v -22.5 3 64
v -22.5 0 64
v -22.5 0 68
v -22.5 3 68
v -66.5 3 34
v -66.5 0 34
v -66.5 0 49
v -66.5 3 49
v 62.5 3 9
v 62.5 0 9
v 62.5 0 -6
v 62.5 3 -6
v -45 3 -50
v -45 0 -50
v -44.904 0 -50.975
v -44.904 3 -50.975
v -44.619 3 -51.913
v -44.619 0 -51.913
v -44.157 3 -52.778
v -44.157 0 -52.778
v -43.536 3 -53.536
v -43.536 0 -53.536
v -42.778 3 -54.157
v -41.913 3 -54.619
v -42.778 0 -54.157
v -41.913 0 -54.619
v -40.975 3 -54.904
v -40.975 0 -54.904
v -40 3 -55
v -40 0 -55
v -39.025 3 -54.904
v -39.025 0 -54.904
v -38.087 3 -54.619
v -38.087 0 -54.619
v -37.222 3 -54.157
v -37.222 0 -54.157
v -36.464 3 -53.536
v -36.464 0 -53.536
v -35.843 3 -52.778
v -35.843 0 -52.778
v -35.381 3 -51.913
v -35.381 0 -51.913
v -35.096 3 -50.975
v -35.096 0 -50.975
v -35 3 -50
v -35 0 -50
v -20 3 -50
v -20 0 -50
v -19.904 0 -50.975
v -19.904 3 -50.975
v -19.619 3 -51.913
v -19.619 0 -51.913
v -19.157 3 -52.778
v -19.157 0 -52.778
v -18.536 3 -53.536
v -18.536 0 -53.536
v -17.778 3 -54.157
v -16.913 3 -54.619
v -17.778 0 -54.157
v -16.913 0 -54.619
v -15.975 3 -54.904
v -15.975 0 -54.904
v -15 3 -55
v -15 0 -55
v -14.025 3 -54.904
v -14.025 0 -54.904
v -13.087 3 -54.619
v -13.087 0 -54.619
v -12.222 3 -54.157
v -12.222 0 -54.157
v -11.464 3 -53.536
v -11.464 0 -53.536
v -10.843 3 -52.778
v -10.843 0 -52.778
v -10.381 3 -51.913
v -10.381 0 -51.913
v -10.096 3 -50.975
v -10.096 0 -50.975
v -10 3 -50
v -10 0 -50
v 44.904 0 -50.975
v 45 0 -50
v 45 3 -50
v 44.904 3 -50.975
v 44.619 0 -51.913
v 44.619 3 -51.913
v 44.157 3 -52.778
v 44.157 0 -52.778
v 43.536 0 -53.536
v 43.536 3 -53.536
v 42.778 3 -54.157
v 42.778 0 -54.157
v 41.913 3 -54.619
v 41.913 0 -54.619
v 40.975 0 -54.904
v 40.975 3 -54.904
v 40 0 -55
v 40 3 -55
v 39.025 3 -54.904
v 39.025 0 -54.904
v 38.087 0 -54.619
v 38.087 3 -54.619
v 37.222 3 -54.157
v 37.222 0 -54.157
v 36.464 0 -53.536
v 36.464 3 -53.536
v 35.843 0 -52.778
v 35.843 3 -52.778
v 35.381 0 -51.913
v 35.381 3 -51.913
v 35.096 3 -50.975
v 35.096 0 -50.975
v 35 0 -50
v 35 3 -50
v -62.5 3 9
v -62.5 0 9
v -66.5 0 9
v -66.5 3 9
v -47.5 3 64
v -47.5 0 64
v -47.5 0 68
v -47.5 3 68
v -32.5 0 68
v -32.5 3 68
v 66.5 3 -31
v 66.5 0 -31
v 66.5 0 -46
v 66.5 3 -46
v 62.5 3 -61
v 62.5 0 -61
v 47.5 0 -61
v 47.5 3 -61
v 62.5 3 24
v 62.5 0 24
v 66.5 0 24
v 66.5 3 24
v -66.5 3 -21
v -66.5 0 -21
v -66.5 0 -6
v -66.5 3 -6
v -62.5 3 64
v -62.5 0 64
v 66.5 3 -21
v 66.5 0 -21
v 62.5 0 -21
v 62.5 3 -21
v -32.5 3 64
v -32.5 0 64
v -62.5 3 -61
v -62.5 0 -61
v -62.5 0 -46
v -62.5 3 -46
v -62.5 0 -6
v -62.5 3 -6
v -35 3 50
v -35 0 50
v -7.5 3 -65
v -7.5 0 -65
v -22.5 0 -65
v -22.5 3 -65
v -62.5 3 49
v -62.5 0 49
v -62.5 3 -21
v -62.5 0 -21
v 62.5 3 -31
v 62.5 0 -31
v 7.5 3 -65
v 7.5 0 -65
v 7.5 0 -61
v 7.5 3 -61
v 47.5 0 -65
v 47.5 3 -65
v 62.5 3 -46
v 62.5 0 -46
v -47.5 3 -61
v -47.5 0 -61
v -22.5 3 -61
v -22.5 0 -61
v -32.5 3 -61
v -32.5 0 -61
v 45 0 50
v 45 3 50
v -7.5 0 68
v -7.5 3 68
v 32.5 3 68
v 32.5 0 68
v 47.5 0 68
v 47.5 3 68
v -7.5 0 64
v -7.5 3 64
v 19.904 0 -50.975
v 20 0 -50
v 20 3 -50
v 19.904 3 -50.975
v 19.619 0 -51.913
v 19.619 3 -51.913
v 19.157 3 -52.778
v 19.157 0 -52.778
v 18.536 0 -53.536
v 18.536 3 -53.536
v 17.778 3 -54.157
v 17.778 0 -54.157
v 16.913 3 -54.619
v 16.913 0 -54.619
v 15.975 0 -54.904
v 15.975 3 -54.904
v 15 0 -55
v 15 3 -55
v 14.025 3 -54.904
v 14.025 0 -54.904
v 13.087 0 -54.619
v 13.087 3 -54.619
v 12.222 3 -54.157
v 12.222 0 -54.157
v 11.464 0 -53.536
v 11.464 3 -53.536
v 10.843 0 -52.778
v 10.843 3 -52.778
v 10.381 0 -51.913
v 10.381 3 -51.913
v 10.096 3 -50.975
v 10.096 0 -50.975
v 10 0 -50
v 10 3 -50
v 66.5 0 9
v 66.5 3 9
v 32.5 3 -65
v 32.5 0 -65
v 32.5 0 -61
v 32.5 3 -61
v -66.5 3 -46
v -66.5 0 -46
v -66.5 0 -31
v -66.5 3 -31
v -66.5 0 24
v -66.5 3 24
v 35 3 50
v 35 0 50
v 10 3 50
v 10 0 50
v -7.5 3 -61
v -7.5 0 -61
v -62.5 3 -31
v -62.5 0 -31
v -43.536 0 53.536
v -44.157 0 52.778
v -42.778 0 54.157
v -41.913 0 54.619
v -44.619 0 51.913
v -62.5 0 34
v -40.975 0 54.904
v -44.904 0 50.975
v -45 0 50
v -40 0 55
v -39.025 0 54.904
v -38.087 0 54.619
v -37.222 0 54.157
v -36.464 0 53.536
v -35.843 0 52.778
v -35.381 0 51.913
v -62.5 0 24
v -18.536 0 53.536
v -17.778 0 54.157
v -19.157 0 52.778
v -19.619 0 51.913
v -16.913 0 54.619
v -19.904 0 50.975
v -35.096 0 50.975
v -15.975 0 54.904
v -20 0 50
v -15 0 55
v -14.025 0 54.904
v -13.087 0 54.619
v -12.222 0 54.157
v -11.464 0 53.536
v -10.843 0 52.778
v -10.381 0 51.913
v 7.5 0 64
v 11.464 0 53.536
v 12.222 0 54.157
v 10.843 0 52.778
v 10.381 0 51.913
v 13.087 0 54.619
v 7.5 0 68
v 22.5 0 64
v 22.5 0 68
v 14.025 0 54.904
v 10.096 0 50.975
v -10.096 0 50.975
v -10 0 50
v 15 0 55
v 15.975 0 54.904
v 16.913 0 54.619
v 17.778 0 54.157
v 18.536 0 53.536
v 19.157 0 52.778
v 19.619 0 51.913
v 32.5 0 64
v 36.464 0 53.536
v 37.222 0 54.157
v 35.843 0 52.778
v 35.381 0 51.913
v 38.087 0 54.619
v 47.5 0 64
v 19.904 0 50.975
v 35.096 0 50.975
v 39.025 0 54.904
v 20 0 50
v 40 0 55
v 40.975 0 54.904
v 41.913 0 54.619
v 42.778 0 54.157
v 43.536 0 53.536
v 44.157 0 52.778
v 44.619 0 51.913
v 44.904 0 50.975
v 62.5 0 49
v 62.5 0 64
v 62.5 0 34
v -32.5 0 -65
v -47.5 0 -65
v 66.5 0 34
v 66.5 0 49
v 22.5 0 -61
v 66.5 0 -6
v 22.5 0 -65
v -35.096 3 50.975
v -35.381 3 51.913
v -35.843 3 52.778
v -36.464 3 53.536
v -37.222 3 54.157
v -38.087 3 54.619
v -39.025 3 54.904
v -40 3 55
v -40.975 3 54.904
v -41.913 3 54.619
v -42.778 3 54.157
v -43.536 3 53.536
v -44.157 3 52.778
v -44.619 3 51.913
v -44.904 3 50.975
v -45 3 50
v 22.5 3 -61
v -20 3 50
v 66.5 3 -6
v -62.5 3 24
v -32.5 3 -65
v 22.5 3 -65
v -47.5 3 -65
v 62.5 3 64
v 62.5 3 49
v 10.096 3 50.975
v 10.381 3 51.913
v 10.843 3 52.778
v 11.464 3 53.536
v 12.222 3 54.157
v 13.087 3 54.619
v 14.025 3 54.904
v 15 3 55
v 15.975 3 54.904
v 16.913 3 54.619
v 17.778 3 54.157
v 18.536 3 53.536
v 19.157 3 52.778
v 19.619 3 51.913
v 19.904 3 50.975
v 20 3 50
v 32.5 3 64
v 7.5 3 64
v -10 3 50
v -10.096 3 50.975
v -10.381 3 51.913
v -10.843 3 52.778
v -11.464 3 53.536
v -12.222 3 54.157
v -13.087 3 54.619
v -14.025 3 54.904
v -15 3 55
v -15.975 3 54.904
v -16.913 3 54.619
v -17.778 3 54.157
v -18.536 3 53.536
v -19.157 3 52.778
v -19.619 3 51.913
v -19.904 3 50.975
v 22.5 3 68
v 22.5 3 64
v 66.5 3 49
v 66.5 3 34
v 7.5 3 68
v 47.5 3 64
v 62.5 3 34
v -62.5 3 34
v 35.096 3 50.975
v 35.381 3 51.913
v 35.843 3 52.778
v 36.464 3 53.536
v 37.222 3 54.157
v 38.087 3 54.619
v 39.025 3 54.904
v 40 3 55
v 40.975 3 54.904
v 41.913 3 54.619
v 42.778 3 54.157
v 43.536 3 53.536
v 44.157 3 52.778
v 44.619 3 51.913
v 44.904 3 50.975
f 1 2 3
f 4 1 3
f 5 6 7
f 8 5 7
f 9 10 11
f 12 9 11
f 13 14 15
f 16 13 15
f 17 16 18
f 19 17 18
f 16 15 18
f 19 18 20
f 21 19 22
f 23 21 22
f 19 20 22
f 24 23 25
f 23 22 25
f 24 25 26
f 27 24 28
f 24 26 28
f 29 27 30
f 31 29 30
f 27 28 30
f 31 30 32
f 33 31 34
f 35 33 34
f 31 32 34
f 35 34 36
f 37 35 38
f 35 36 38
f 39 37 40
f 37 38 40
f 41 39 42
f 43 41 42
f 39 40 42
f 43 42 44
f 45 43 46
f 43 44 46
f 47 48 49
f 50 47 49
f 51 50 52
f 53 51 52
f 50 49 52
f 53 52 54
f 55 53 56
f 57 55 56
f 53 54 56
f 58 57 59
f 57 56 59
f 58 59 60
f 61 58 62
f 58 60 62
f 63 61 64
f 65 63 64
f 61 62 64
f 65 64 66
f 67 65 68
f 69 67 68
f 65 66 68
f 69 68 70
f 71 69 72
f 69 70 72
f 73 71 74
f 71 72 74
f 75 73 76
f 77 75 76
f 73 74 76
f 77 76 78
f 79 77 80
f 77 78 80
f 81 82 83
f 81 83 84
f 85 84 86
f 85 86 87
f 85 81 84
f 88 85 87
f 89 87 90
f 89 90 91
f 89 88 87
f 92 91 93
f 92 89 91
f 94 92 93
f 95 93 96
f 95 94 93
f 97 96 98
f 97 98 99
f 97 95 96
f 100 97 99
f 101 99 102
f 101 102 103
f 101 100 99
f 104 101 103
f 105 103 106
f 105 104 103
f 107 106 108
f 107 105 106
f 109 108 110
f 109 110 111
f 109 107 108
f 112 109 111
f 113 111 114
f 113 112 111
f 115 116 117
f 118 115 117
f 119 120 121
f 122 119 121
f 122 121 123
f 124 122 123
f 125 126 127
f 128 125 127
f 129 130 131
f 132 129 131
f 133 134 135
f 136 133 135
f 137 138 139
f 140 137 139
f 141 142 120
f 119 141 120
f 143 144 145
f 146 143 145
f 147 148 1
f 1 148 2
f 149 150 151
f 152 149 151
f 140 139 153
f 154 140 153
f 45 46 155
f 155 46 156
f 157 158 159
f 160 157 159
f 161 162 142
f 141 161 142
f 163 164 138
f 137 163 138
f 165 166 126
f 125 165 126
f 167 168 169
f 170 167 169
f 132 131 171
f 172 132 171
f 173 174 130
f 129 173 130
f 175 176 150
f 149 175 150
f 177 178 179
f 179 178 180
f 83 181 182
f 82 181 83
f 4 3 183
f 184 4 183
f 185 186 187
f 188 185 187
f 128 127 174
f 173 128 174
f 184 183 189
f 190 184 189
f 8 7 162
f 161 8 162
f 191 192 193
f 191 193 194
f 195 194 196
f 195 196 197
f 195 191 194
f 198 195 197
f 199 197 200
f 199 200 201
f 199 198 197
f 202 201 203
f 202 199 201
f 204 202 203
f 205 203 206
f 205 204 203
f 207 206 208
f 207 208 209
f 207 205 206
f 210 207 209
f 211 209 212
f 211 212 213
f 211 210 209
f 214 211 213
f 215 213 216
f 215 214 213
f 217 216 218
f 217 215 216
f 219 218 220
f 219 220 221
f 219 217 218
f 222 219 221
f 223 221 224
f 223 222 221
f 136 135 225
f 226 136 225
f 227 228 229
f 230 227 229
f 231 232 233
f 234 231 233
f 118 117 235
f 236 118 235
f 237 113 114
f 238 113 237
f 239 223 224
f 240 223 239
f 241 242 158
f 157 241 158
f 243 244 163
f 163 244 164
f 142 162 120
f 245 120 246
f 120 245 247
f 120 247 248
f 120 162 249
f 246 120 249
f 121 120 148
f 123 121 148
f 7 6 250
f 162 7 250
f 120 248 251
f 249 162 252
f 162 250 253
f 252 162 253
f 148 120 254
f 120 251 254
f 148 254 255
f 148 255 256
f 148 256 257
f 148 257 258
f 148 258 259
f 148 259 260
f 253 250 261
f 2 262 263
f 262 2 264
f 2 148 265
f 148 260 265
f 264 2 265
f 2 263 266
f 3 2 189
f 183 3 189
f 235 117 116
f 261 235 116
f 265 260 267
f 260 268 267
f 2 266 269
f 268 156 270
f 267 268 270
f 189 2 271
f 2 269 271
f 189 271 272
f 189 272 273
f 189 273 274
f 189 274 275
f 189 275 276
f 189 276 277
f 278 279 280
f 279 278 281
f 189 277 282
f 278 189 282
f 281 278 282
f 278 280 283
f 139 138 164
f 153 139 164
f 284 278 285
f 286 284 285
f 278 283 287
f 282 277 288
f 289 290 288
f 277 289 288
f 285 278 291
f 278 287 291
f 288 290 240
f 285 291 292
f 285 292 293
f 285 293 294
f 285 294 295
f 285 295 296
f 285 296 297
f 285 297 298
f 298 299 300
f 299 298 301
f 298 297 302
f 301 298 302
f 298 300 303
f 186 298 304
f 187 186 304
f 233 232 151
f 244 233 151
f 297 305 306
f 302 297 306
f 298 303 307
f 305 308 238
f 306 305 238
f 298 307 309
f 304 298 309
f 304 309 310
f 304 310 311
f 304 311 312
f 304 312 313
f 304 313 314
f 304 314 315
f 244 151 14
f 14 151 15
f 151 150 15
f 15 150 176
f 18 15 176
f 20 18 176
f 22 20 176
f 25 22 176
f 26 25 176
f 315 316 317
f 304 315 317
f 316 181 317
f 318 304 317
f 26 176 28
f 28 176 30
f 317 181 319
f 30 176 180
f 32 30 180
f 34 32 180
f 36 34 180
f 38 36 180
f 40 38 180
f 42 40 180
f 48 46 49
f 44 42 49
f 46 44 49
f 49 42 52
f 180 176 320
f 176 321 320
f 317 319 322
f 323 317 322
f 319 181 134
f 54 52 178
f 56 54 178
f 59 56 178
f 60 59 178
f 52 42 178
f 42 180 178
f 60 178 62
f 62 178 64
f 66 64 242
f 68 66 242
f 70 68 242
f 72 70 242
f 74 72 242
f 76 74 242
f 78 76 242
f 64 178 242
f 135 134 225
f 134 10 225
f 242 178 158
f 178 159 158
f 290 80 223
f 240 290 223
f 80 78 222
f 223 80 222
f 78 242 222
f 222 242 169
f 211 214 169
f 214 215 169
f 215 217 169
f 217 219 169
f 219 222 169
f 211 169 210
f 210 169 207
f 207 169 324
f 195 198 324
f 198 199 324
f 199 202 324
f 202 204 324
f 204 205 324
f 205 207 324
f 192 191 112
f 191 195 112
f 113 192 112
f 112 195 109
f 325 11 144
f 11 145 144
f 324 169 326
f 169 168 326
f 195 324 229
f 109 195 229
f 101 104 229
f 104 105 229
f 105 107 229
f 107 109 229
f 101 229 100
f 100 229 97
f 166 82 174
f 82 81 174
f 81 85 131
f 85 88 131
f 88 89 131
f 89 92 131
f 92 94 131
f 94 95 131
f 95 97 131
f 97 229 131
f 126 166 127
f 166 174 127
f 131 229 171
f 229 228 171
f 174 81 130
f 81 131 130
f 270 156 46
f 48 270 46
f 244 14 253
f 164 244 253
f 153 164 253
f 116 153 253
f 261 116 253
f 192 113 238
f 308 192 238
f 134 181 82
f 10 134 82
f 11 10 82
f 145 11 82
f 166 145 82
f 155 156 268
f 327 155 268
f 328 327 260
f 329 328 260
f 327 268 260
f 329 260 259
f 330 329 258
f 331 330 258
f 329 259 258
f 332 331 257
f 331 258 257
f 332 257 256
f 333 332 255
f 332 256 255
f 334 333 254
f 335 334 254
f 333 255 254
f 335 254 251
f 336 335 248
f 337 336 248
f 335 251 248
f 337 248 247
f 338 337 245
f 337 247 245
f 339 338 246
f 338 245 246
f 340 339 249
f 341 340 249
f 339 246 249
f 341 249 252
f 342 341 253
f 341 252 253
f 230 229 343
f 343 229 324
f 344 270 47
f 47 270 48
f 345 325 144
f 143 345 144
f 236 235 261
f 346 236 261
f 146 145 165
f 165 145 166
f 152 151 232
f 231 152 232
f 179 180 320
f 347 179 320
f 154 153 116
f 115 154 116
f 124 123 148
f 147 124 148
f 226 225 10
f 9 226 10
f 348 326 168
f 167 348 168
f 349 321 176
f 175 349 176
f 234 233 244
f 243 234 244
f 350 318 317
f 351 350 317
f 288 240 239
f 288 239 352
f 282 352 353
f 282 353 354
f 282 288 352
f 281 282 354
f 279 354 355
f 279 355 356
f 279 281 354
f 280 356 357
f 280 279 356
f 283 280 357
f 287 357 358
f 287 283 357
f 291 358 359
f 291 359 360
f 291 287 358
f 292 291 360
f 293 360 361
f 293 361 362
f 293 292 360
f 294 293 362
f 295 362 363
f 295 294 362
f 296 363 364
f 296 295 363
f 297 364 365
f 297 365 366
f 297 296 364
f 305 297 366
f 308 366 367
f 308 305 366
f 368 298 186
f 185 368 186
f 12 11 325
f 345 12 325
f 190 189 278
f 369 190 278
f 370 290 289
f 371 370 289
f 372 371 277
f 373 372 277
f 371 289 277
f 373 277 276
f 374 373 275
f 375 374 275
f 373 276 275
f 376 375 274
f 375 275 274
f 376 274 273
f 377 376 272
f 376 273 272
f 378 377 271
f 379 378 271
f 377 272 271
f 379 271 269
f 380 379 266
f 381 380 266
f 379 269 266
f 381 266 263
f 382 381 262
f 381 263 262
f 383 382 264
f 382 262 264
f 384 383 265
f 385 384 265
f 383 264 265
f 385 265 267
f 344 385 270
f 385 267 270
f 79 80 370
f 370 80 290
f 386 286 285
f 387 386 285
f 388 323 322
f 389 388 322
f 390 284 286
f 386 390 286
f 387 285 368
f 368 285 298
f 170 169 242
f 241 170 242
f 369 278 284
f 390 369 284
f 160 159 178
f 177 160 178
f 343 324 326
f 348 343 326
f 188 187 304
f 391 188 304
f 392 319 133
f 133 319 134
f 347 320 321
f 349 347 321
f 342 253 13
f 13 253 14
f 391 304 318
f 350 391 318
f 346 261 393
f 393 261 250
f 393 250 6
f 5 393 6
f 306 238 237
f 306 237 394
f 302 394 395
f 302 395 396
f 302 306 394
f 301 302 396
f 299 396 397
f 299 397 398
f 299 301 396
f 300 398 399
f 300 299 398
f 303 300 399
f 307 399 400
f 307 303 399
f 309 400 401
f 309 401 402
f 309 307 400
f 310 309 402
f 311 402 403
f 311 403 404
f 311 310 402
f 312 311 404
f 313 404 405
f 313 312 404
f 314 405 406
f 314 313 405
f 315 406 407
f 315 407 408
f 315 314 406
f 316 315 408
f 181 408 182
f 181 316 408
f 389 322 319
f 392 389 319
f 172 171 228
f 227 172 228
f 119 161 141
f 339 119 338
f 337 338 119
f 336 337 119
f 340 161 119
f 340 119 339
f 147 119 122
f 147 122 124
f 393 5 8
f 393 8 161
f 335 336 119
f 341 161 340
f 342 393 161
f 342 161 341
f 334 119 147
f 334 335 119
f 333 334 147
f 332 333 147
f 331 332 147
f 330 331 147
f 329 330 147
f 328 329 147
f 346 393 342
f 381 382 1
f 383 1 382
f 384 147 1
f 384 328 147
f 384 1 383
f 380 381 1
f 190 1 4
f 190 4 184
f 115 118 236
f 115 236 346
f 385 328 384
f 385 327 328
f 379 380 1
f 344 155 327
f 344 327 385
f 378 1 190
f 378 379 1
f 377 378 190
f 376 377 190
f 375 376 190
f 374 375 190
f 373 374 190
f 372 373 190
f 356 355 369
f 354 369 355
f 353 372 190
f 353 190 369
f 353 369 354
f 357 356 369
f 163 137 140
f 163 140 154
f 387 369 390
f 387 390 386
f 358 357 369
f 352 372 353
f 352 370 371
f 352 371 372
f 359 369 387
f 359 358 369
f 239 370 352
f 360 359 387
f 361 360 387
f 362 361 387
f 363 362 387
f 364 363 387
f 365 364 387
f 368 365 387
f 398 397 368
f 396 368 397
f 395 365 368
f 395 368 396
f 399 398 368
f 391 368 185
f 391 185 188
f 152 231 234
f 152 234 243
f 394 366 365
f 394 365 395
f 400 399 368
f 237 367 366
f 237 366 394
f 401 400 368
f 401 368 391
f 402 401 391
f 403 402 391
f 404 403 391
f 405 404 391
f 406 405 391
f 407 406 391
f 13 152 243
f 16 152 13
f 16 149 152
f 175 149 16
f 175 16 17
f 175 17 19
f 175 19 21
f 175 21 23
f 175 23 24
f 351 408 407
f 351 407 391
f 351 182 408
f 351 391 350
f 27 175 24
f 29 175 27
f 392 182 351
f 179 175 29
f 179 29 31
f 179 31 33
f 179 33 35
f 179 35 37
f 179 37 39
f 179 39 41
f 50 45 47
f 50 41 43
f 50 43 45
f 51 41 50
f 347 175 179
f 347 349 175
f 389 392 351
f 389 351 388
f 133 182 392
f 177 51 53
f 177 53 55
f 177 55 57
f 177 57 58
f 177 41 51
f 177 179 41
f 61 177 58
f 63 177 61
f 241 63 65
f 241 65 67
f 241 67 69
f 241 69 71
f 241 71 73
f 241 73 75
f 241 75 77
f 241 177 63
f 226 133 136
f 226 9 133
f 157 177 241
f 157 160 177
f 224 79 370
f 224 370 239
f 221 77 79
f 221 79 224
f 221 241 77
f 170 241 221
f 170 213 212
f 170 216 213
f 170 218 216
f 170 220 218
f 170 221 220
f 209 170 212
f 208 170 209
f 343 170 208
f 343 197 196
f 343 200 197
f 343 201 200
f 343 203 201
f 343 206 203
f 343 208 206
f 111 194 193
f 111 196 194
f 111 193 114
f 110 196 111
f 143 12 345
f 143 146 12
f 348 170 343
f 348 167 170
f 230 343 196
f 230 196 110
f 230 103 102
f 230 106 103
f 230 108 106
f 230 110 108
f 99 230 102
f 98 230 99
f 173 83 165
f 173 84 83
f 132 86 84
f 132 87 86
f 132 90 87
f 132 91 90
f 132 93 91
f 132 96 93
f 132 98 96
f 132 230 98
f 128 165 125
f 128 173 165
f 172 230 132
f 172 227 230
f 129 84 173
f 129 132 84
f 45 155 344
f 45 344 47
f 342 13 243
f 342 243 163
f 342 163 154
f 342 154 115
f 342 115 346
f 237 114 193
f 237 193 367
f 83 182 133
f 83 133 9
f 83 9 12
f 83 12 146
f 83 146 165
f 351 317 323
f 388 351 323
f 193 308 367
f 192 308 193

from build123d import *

# Parameters (mm, degrees)
BOSS_EXTRUDE1_DEPTH = 3


with BuildPart() as part:
    # Sketch1 → Boss-Extrude1 (new body)
    with BuildSketch(Plane(origin=(0, 0, 0), x_dir=(1, 0, 0), z_dir=(0, 1, 0))):
        Polygon((-66.5, 46), (-66.5, 31), (-62.5, 31), (-62.5, 21), (-66.5, 21), (-66.5, 6), (-62.5, 6), (-62.5, -9), (-66.5, -9), (-66.5, -24), (-62.5, -24), (-62.5, -34), (-66.5, -34), (-66.5, -49), (-62.5, -49), (-62.5, -59), (-62.5, -64), (-57.5, -64), (-47.5, -64), (-47.5, -68), (-32.5, -68), (-32.5, -64), (-22.5, -64), (-22.5, -68), (-7.5, -68), (-7.5, -64), (7.5, -64), (7.5, -68), (22.5, -68), (22.5, -64), (32.5, -64), (32.5, -68), (47.5, -68), (47.5, -64), (57.5, -64), (62.5, -64), (62.5, -59), (62.5, -49), (66.5, -49), (66.5, -34), (62.5, -34), (62.5, -24), (66.5, -24), (66.5, -9), (62.5, -9), (62.5, 6), (66.5, 6), (66.5, 21), (62.5, 21), (62.5, 31), (66.5, 31), (66.5, 46), (62.5, 46), (62.5, 56), (62.5, 61), (57.5, 61), (47.5, 61), (47.5, 65), (32.5, 65), (32.5, 61), (22.5, 61), (22.5, 65), (7.5, 65), (7.5, 61), (-7.5, 61), (-7.5, 65), (-22.5, 65), (-22.5, 61), (-32.5, 61), (-32.5, 65), (-47.5, 65), (-47.5, 61), (-57.5, 61), (-62.5, 61), (-62.5, 56), (-62.5, 46), align=None)
        with BuildLine():
            Line((-35, 50), (-35, -50))
            ThreePointArc((-35, -50), (-40, -55), (-45, -50))
            Line((-45, -50), (-45, 50))
            ThreePointArc((-45, 50), (-40, 55), (-35, 50))
        make_face(mode=Mode.SUBTRACT)
        with BuildLine():
            Line((-10, 50), (-10, -50))
            ThreePointArc((-10, -50), (-15, -55), (-20, -50))
            Line((-20, -50), (-20, 50))
            ThreePointArc((-20, 50), (-15, 55), (-10, 50))
        make_face(mode=Mode.SUBTRACT)
        with BuildLine():
            Line((10, 50), (10, -50))
            ThreePointArc((10, -50), (15, -55), (20, -50))
            Line((20, -50), (20, 50))
            ThreePointArc((20, 50), (15, 55), (10, 50))
        make_face(mode=Mode.SUBTRACT)
        with BuildLine():
            Line((35, 50), (35, -50))
            ThreePointArc((35, -50), (40, -55), (45, -50))
            Line((45, -50), (45, 50))
            ThreePointArc((45, 50), (40, 55), (35, 50))
        make_face(mode=Mode.SUBTRACT)
    extrude(amount=BOSS_EXTRUDE1_DEPTH)


solid = part.part
